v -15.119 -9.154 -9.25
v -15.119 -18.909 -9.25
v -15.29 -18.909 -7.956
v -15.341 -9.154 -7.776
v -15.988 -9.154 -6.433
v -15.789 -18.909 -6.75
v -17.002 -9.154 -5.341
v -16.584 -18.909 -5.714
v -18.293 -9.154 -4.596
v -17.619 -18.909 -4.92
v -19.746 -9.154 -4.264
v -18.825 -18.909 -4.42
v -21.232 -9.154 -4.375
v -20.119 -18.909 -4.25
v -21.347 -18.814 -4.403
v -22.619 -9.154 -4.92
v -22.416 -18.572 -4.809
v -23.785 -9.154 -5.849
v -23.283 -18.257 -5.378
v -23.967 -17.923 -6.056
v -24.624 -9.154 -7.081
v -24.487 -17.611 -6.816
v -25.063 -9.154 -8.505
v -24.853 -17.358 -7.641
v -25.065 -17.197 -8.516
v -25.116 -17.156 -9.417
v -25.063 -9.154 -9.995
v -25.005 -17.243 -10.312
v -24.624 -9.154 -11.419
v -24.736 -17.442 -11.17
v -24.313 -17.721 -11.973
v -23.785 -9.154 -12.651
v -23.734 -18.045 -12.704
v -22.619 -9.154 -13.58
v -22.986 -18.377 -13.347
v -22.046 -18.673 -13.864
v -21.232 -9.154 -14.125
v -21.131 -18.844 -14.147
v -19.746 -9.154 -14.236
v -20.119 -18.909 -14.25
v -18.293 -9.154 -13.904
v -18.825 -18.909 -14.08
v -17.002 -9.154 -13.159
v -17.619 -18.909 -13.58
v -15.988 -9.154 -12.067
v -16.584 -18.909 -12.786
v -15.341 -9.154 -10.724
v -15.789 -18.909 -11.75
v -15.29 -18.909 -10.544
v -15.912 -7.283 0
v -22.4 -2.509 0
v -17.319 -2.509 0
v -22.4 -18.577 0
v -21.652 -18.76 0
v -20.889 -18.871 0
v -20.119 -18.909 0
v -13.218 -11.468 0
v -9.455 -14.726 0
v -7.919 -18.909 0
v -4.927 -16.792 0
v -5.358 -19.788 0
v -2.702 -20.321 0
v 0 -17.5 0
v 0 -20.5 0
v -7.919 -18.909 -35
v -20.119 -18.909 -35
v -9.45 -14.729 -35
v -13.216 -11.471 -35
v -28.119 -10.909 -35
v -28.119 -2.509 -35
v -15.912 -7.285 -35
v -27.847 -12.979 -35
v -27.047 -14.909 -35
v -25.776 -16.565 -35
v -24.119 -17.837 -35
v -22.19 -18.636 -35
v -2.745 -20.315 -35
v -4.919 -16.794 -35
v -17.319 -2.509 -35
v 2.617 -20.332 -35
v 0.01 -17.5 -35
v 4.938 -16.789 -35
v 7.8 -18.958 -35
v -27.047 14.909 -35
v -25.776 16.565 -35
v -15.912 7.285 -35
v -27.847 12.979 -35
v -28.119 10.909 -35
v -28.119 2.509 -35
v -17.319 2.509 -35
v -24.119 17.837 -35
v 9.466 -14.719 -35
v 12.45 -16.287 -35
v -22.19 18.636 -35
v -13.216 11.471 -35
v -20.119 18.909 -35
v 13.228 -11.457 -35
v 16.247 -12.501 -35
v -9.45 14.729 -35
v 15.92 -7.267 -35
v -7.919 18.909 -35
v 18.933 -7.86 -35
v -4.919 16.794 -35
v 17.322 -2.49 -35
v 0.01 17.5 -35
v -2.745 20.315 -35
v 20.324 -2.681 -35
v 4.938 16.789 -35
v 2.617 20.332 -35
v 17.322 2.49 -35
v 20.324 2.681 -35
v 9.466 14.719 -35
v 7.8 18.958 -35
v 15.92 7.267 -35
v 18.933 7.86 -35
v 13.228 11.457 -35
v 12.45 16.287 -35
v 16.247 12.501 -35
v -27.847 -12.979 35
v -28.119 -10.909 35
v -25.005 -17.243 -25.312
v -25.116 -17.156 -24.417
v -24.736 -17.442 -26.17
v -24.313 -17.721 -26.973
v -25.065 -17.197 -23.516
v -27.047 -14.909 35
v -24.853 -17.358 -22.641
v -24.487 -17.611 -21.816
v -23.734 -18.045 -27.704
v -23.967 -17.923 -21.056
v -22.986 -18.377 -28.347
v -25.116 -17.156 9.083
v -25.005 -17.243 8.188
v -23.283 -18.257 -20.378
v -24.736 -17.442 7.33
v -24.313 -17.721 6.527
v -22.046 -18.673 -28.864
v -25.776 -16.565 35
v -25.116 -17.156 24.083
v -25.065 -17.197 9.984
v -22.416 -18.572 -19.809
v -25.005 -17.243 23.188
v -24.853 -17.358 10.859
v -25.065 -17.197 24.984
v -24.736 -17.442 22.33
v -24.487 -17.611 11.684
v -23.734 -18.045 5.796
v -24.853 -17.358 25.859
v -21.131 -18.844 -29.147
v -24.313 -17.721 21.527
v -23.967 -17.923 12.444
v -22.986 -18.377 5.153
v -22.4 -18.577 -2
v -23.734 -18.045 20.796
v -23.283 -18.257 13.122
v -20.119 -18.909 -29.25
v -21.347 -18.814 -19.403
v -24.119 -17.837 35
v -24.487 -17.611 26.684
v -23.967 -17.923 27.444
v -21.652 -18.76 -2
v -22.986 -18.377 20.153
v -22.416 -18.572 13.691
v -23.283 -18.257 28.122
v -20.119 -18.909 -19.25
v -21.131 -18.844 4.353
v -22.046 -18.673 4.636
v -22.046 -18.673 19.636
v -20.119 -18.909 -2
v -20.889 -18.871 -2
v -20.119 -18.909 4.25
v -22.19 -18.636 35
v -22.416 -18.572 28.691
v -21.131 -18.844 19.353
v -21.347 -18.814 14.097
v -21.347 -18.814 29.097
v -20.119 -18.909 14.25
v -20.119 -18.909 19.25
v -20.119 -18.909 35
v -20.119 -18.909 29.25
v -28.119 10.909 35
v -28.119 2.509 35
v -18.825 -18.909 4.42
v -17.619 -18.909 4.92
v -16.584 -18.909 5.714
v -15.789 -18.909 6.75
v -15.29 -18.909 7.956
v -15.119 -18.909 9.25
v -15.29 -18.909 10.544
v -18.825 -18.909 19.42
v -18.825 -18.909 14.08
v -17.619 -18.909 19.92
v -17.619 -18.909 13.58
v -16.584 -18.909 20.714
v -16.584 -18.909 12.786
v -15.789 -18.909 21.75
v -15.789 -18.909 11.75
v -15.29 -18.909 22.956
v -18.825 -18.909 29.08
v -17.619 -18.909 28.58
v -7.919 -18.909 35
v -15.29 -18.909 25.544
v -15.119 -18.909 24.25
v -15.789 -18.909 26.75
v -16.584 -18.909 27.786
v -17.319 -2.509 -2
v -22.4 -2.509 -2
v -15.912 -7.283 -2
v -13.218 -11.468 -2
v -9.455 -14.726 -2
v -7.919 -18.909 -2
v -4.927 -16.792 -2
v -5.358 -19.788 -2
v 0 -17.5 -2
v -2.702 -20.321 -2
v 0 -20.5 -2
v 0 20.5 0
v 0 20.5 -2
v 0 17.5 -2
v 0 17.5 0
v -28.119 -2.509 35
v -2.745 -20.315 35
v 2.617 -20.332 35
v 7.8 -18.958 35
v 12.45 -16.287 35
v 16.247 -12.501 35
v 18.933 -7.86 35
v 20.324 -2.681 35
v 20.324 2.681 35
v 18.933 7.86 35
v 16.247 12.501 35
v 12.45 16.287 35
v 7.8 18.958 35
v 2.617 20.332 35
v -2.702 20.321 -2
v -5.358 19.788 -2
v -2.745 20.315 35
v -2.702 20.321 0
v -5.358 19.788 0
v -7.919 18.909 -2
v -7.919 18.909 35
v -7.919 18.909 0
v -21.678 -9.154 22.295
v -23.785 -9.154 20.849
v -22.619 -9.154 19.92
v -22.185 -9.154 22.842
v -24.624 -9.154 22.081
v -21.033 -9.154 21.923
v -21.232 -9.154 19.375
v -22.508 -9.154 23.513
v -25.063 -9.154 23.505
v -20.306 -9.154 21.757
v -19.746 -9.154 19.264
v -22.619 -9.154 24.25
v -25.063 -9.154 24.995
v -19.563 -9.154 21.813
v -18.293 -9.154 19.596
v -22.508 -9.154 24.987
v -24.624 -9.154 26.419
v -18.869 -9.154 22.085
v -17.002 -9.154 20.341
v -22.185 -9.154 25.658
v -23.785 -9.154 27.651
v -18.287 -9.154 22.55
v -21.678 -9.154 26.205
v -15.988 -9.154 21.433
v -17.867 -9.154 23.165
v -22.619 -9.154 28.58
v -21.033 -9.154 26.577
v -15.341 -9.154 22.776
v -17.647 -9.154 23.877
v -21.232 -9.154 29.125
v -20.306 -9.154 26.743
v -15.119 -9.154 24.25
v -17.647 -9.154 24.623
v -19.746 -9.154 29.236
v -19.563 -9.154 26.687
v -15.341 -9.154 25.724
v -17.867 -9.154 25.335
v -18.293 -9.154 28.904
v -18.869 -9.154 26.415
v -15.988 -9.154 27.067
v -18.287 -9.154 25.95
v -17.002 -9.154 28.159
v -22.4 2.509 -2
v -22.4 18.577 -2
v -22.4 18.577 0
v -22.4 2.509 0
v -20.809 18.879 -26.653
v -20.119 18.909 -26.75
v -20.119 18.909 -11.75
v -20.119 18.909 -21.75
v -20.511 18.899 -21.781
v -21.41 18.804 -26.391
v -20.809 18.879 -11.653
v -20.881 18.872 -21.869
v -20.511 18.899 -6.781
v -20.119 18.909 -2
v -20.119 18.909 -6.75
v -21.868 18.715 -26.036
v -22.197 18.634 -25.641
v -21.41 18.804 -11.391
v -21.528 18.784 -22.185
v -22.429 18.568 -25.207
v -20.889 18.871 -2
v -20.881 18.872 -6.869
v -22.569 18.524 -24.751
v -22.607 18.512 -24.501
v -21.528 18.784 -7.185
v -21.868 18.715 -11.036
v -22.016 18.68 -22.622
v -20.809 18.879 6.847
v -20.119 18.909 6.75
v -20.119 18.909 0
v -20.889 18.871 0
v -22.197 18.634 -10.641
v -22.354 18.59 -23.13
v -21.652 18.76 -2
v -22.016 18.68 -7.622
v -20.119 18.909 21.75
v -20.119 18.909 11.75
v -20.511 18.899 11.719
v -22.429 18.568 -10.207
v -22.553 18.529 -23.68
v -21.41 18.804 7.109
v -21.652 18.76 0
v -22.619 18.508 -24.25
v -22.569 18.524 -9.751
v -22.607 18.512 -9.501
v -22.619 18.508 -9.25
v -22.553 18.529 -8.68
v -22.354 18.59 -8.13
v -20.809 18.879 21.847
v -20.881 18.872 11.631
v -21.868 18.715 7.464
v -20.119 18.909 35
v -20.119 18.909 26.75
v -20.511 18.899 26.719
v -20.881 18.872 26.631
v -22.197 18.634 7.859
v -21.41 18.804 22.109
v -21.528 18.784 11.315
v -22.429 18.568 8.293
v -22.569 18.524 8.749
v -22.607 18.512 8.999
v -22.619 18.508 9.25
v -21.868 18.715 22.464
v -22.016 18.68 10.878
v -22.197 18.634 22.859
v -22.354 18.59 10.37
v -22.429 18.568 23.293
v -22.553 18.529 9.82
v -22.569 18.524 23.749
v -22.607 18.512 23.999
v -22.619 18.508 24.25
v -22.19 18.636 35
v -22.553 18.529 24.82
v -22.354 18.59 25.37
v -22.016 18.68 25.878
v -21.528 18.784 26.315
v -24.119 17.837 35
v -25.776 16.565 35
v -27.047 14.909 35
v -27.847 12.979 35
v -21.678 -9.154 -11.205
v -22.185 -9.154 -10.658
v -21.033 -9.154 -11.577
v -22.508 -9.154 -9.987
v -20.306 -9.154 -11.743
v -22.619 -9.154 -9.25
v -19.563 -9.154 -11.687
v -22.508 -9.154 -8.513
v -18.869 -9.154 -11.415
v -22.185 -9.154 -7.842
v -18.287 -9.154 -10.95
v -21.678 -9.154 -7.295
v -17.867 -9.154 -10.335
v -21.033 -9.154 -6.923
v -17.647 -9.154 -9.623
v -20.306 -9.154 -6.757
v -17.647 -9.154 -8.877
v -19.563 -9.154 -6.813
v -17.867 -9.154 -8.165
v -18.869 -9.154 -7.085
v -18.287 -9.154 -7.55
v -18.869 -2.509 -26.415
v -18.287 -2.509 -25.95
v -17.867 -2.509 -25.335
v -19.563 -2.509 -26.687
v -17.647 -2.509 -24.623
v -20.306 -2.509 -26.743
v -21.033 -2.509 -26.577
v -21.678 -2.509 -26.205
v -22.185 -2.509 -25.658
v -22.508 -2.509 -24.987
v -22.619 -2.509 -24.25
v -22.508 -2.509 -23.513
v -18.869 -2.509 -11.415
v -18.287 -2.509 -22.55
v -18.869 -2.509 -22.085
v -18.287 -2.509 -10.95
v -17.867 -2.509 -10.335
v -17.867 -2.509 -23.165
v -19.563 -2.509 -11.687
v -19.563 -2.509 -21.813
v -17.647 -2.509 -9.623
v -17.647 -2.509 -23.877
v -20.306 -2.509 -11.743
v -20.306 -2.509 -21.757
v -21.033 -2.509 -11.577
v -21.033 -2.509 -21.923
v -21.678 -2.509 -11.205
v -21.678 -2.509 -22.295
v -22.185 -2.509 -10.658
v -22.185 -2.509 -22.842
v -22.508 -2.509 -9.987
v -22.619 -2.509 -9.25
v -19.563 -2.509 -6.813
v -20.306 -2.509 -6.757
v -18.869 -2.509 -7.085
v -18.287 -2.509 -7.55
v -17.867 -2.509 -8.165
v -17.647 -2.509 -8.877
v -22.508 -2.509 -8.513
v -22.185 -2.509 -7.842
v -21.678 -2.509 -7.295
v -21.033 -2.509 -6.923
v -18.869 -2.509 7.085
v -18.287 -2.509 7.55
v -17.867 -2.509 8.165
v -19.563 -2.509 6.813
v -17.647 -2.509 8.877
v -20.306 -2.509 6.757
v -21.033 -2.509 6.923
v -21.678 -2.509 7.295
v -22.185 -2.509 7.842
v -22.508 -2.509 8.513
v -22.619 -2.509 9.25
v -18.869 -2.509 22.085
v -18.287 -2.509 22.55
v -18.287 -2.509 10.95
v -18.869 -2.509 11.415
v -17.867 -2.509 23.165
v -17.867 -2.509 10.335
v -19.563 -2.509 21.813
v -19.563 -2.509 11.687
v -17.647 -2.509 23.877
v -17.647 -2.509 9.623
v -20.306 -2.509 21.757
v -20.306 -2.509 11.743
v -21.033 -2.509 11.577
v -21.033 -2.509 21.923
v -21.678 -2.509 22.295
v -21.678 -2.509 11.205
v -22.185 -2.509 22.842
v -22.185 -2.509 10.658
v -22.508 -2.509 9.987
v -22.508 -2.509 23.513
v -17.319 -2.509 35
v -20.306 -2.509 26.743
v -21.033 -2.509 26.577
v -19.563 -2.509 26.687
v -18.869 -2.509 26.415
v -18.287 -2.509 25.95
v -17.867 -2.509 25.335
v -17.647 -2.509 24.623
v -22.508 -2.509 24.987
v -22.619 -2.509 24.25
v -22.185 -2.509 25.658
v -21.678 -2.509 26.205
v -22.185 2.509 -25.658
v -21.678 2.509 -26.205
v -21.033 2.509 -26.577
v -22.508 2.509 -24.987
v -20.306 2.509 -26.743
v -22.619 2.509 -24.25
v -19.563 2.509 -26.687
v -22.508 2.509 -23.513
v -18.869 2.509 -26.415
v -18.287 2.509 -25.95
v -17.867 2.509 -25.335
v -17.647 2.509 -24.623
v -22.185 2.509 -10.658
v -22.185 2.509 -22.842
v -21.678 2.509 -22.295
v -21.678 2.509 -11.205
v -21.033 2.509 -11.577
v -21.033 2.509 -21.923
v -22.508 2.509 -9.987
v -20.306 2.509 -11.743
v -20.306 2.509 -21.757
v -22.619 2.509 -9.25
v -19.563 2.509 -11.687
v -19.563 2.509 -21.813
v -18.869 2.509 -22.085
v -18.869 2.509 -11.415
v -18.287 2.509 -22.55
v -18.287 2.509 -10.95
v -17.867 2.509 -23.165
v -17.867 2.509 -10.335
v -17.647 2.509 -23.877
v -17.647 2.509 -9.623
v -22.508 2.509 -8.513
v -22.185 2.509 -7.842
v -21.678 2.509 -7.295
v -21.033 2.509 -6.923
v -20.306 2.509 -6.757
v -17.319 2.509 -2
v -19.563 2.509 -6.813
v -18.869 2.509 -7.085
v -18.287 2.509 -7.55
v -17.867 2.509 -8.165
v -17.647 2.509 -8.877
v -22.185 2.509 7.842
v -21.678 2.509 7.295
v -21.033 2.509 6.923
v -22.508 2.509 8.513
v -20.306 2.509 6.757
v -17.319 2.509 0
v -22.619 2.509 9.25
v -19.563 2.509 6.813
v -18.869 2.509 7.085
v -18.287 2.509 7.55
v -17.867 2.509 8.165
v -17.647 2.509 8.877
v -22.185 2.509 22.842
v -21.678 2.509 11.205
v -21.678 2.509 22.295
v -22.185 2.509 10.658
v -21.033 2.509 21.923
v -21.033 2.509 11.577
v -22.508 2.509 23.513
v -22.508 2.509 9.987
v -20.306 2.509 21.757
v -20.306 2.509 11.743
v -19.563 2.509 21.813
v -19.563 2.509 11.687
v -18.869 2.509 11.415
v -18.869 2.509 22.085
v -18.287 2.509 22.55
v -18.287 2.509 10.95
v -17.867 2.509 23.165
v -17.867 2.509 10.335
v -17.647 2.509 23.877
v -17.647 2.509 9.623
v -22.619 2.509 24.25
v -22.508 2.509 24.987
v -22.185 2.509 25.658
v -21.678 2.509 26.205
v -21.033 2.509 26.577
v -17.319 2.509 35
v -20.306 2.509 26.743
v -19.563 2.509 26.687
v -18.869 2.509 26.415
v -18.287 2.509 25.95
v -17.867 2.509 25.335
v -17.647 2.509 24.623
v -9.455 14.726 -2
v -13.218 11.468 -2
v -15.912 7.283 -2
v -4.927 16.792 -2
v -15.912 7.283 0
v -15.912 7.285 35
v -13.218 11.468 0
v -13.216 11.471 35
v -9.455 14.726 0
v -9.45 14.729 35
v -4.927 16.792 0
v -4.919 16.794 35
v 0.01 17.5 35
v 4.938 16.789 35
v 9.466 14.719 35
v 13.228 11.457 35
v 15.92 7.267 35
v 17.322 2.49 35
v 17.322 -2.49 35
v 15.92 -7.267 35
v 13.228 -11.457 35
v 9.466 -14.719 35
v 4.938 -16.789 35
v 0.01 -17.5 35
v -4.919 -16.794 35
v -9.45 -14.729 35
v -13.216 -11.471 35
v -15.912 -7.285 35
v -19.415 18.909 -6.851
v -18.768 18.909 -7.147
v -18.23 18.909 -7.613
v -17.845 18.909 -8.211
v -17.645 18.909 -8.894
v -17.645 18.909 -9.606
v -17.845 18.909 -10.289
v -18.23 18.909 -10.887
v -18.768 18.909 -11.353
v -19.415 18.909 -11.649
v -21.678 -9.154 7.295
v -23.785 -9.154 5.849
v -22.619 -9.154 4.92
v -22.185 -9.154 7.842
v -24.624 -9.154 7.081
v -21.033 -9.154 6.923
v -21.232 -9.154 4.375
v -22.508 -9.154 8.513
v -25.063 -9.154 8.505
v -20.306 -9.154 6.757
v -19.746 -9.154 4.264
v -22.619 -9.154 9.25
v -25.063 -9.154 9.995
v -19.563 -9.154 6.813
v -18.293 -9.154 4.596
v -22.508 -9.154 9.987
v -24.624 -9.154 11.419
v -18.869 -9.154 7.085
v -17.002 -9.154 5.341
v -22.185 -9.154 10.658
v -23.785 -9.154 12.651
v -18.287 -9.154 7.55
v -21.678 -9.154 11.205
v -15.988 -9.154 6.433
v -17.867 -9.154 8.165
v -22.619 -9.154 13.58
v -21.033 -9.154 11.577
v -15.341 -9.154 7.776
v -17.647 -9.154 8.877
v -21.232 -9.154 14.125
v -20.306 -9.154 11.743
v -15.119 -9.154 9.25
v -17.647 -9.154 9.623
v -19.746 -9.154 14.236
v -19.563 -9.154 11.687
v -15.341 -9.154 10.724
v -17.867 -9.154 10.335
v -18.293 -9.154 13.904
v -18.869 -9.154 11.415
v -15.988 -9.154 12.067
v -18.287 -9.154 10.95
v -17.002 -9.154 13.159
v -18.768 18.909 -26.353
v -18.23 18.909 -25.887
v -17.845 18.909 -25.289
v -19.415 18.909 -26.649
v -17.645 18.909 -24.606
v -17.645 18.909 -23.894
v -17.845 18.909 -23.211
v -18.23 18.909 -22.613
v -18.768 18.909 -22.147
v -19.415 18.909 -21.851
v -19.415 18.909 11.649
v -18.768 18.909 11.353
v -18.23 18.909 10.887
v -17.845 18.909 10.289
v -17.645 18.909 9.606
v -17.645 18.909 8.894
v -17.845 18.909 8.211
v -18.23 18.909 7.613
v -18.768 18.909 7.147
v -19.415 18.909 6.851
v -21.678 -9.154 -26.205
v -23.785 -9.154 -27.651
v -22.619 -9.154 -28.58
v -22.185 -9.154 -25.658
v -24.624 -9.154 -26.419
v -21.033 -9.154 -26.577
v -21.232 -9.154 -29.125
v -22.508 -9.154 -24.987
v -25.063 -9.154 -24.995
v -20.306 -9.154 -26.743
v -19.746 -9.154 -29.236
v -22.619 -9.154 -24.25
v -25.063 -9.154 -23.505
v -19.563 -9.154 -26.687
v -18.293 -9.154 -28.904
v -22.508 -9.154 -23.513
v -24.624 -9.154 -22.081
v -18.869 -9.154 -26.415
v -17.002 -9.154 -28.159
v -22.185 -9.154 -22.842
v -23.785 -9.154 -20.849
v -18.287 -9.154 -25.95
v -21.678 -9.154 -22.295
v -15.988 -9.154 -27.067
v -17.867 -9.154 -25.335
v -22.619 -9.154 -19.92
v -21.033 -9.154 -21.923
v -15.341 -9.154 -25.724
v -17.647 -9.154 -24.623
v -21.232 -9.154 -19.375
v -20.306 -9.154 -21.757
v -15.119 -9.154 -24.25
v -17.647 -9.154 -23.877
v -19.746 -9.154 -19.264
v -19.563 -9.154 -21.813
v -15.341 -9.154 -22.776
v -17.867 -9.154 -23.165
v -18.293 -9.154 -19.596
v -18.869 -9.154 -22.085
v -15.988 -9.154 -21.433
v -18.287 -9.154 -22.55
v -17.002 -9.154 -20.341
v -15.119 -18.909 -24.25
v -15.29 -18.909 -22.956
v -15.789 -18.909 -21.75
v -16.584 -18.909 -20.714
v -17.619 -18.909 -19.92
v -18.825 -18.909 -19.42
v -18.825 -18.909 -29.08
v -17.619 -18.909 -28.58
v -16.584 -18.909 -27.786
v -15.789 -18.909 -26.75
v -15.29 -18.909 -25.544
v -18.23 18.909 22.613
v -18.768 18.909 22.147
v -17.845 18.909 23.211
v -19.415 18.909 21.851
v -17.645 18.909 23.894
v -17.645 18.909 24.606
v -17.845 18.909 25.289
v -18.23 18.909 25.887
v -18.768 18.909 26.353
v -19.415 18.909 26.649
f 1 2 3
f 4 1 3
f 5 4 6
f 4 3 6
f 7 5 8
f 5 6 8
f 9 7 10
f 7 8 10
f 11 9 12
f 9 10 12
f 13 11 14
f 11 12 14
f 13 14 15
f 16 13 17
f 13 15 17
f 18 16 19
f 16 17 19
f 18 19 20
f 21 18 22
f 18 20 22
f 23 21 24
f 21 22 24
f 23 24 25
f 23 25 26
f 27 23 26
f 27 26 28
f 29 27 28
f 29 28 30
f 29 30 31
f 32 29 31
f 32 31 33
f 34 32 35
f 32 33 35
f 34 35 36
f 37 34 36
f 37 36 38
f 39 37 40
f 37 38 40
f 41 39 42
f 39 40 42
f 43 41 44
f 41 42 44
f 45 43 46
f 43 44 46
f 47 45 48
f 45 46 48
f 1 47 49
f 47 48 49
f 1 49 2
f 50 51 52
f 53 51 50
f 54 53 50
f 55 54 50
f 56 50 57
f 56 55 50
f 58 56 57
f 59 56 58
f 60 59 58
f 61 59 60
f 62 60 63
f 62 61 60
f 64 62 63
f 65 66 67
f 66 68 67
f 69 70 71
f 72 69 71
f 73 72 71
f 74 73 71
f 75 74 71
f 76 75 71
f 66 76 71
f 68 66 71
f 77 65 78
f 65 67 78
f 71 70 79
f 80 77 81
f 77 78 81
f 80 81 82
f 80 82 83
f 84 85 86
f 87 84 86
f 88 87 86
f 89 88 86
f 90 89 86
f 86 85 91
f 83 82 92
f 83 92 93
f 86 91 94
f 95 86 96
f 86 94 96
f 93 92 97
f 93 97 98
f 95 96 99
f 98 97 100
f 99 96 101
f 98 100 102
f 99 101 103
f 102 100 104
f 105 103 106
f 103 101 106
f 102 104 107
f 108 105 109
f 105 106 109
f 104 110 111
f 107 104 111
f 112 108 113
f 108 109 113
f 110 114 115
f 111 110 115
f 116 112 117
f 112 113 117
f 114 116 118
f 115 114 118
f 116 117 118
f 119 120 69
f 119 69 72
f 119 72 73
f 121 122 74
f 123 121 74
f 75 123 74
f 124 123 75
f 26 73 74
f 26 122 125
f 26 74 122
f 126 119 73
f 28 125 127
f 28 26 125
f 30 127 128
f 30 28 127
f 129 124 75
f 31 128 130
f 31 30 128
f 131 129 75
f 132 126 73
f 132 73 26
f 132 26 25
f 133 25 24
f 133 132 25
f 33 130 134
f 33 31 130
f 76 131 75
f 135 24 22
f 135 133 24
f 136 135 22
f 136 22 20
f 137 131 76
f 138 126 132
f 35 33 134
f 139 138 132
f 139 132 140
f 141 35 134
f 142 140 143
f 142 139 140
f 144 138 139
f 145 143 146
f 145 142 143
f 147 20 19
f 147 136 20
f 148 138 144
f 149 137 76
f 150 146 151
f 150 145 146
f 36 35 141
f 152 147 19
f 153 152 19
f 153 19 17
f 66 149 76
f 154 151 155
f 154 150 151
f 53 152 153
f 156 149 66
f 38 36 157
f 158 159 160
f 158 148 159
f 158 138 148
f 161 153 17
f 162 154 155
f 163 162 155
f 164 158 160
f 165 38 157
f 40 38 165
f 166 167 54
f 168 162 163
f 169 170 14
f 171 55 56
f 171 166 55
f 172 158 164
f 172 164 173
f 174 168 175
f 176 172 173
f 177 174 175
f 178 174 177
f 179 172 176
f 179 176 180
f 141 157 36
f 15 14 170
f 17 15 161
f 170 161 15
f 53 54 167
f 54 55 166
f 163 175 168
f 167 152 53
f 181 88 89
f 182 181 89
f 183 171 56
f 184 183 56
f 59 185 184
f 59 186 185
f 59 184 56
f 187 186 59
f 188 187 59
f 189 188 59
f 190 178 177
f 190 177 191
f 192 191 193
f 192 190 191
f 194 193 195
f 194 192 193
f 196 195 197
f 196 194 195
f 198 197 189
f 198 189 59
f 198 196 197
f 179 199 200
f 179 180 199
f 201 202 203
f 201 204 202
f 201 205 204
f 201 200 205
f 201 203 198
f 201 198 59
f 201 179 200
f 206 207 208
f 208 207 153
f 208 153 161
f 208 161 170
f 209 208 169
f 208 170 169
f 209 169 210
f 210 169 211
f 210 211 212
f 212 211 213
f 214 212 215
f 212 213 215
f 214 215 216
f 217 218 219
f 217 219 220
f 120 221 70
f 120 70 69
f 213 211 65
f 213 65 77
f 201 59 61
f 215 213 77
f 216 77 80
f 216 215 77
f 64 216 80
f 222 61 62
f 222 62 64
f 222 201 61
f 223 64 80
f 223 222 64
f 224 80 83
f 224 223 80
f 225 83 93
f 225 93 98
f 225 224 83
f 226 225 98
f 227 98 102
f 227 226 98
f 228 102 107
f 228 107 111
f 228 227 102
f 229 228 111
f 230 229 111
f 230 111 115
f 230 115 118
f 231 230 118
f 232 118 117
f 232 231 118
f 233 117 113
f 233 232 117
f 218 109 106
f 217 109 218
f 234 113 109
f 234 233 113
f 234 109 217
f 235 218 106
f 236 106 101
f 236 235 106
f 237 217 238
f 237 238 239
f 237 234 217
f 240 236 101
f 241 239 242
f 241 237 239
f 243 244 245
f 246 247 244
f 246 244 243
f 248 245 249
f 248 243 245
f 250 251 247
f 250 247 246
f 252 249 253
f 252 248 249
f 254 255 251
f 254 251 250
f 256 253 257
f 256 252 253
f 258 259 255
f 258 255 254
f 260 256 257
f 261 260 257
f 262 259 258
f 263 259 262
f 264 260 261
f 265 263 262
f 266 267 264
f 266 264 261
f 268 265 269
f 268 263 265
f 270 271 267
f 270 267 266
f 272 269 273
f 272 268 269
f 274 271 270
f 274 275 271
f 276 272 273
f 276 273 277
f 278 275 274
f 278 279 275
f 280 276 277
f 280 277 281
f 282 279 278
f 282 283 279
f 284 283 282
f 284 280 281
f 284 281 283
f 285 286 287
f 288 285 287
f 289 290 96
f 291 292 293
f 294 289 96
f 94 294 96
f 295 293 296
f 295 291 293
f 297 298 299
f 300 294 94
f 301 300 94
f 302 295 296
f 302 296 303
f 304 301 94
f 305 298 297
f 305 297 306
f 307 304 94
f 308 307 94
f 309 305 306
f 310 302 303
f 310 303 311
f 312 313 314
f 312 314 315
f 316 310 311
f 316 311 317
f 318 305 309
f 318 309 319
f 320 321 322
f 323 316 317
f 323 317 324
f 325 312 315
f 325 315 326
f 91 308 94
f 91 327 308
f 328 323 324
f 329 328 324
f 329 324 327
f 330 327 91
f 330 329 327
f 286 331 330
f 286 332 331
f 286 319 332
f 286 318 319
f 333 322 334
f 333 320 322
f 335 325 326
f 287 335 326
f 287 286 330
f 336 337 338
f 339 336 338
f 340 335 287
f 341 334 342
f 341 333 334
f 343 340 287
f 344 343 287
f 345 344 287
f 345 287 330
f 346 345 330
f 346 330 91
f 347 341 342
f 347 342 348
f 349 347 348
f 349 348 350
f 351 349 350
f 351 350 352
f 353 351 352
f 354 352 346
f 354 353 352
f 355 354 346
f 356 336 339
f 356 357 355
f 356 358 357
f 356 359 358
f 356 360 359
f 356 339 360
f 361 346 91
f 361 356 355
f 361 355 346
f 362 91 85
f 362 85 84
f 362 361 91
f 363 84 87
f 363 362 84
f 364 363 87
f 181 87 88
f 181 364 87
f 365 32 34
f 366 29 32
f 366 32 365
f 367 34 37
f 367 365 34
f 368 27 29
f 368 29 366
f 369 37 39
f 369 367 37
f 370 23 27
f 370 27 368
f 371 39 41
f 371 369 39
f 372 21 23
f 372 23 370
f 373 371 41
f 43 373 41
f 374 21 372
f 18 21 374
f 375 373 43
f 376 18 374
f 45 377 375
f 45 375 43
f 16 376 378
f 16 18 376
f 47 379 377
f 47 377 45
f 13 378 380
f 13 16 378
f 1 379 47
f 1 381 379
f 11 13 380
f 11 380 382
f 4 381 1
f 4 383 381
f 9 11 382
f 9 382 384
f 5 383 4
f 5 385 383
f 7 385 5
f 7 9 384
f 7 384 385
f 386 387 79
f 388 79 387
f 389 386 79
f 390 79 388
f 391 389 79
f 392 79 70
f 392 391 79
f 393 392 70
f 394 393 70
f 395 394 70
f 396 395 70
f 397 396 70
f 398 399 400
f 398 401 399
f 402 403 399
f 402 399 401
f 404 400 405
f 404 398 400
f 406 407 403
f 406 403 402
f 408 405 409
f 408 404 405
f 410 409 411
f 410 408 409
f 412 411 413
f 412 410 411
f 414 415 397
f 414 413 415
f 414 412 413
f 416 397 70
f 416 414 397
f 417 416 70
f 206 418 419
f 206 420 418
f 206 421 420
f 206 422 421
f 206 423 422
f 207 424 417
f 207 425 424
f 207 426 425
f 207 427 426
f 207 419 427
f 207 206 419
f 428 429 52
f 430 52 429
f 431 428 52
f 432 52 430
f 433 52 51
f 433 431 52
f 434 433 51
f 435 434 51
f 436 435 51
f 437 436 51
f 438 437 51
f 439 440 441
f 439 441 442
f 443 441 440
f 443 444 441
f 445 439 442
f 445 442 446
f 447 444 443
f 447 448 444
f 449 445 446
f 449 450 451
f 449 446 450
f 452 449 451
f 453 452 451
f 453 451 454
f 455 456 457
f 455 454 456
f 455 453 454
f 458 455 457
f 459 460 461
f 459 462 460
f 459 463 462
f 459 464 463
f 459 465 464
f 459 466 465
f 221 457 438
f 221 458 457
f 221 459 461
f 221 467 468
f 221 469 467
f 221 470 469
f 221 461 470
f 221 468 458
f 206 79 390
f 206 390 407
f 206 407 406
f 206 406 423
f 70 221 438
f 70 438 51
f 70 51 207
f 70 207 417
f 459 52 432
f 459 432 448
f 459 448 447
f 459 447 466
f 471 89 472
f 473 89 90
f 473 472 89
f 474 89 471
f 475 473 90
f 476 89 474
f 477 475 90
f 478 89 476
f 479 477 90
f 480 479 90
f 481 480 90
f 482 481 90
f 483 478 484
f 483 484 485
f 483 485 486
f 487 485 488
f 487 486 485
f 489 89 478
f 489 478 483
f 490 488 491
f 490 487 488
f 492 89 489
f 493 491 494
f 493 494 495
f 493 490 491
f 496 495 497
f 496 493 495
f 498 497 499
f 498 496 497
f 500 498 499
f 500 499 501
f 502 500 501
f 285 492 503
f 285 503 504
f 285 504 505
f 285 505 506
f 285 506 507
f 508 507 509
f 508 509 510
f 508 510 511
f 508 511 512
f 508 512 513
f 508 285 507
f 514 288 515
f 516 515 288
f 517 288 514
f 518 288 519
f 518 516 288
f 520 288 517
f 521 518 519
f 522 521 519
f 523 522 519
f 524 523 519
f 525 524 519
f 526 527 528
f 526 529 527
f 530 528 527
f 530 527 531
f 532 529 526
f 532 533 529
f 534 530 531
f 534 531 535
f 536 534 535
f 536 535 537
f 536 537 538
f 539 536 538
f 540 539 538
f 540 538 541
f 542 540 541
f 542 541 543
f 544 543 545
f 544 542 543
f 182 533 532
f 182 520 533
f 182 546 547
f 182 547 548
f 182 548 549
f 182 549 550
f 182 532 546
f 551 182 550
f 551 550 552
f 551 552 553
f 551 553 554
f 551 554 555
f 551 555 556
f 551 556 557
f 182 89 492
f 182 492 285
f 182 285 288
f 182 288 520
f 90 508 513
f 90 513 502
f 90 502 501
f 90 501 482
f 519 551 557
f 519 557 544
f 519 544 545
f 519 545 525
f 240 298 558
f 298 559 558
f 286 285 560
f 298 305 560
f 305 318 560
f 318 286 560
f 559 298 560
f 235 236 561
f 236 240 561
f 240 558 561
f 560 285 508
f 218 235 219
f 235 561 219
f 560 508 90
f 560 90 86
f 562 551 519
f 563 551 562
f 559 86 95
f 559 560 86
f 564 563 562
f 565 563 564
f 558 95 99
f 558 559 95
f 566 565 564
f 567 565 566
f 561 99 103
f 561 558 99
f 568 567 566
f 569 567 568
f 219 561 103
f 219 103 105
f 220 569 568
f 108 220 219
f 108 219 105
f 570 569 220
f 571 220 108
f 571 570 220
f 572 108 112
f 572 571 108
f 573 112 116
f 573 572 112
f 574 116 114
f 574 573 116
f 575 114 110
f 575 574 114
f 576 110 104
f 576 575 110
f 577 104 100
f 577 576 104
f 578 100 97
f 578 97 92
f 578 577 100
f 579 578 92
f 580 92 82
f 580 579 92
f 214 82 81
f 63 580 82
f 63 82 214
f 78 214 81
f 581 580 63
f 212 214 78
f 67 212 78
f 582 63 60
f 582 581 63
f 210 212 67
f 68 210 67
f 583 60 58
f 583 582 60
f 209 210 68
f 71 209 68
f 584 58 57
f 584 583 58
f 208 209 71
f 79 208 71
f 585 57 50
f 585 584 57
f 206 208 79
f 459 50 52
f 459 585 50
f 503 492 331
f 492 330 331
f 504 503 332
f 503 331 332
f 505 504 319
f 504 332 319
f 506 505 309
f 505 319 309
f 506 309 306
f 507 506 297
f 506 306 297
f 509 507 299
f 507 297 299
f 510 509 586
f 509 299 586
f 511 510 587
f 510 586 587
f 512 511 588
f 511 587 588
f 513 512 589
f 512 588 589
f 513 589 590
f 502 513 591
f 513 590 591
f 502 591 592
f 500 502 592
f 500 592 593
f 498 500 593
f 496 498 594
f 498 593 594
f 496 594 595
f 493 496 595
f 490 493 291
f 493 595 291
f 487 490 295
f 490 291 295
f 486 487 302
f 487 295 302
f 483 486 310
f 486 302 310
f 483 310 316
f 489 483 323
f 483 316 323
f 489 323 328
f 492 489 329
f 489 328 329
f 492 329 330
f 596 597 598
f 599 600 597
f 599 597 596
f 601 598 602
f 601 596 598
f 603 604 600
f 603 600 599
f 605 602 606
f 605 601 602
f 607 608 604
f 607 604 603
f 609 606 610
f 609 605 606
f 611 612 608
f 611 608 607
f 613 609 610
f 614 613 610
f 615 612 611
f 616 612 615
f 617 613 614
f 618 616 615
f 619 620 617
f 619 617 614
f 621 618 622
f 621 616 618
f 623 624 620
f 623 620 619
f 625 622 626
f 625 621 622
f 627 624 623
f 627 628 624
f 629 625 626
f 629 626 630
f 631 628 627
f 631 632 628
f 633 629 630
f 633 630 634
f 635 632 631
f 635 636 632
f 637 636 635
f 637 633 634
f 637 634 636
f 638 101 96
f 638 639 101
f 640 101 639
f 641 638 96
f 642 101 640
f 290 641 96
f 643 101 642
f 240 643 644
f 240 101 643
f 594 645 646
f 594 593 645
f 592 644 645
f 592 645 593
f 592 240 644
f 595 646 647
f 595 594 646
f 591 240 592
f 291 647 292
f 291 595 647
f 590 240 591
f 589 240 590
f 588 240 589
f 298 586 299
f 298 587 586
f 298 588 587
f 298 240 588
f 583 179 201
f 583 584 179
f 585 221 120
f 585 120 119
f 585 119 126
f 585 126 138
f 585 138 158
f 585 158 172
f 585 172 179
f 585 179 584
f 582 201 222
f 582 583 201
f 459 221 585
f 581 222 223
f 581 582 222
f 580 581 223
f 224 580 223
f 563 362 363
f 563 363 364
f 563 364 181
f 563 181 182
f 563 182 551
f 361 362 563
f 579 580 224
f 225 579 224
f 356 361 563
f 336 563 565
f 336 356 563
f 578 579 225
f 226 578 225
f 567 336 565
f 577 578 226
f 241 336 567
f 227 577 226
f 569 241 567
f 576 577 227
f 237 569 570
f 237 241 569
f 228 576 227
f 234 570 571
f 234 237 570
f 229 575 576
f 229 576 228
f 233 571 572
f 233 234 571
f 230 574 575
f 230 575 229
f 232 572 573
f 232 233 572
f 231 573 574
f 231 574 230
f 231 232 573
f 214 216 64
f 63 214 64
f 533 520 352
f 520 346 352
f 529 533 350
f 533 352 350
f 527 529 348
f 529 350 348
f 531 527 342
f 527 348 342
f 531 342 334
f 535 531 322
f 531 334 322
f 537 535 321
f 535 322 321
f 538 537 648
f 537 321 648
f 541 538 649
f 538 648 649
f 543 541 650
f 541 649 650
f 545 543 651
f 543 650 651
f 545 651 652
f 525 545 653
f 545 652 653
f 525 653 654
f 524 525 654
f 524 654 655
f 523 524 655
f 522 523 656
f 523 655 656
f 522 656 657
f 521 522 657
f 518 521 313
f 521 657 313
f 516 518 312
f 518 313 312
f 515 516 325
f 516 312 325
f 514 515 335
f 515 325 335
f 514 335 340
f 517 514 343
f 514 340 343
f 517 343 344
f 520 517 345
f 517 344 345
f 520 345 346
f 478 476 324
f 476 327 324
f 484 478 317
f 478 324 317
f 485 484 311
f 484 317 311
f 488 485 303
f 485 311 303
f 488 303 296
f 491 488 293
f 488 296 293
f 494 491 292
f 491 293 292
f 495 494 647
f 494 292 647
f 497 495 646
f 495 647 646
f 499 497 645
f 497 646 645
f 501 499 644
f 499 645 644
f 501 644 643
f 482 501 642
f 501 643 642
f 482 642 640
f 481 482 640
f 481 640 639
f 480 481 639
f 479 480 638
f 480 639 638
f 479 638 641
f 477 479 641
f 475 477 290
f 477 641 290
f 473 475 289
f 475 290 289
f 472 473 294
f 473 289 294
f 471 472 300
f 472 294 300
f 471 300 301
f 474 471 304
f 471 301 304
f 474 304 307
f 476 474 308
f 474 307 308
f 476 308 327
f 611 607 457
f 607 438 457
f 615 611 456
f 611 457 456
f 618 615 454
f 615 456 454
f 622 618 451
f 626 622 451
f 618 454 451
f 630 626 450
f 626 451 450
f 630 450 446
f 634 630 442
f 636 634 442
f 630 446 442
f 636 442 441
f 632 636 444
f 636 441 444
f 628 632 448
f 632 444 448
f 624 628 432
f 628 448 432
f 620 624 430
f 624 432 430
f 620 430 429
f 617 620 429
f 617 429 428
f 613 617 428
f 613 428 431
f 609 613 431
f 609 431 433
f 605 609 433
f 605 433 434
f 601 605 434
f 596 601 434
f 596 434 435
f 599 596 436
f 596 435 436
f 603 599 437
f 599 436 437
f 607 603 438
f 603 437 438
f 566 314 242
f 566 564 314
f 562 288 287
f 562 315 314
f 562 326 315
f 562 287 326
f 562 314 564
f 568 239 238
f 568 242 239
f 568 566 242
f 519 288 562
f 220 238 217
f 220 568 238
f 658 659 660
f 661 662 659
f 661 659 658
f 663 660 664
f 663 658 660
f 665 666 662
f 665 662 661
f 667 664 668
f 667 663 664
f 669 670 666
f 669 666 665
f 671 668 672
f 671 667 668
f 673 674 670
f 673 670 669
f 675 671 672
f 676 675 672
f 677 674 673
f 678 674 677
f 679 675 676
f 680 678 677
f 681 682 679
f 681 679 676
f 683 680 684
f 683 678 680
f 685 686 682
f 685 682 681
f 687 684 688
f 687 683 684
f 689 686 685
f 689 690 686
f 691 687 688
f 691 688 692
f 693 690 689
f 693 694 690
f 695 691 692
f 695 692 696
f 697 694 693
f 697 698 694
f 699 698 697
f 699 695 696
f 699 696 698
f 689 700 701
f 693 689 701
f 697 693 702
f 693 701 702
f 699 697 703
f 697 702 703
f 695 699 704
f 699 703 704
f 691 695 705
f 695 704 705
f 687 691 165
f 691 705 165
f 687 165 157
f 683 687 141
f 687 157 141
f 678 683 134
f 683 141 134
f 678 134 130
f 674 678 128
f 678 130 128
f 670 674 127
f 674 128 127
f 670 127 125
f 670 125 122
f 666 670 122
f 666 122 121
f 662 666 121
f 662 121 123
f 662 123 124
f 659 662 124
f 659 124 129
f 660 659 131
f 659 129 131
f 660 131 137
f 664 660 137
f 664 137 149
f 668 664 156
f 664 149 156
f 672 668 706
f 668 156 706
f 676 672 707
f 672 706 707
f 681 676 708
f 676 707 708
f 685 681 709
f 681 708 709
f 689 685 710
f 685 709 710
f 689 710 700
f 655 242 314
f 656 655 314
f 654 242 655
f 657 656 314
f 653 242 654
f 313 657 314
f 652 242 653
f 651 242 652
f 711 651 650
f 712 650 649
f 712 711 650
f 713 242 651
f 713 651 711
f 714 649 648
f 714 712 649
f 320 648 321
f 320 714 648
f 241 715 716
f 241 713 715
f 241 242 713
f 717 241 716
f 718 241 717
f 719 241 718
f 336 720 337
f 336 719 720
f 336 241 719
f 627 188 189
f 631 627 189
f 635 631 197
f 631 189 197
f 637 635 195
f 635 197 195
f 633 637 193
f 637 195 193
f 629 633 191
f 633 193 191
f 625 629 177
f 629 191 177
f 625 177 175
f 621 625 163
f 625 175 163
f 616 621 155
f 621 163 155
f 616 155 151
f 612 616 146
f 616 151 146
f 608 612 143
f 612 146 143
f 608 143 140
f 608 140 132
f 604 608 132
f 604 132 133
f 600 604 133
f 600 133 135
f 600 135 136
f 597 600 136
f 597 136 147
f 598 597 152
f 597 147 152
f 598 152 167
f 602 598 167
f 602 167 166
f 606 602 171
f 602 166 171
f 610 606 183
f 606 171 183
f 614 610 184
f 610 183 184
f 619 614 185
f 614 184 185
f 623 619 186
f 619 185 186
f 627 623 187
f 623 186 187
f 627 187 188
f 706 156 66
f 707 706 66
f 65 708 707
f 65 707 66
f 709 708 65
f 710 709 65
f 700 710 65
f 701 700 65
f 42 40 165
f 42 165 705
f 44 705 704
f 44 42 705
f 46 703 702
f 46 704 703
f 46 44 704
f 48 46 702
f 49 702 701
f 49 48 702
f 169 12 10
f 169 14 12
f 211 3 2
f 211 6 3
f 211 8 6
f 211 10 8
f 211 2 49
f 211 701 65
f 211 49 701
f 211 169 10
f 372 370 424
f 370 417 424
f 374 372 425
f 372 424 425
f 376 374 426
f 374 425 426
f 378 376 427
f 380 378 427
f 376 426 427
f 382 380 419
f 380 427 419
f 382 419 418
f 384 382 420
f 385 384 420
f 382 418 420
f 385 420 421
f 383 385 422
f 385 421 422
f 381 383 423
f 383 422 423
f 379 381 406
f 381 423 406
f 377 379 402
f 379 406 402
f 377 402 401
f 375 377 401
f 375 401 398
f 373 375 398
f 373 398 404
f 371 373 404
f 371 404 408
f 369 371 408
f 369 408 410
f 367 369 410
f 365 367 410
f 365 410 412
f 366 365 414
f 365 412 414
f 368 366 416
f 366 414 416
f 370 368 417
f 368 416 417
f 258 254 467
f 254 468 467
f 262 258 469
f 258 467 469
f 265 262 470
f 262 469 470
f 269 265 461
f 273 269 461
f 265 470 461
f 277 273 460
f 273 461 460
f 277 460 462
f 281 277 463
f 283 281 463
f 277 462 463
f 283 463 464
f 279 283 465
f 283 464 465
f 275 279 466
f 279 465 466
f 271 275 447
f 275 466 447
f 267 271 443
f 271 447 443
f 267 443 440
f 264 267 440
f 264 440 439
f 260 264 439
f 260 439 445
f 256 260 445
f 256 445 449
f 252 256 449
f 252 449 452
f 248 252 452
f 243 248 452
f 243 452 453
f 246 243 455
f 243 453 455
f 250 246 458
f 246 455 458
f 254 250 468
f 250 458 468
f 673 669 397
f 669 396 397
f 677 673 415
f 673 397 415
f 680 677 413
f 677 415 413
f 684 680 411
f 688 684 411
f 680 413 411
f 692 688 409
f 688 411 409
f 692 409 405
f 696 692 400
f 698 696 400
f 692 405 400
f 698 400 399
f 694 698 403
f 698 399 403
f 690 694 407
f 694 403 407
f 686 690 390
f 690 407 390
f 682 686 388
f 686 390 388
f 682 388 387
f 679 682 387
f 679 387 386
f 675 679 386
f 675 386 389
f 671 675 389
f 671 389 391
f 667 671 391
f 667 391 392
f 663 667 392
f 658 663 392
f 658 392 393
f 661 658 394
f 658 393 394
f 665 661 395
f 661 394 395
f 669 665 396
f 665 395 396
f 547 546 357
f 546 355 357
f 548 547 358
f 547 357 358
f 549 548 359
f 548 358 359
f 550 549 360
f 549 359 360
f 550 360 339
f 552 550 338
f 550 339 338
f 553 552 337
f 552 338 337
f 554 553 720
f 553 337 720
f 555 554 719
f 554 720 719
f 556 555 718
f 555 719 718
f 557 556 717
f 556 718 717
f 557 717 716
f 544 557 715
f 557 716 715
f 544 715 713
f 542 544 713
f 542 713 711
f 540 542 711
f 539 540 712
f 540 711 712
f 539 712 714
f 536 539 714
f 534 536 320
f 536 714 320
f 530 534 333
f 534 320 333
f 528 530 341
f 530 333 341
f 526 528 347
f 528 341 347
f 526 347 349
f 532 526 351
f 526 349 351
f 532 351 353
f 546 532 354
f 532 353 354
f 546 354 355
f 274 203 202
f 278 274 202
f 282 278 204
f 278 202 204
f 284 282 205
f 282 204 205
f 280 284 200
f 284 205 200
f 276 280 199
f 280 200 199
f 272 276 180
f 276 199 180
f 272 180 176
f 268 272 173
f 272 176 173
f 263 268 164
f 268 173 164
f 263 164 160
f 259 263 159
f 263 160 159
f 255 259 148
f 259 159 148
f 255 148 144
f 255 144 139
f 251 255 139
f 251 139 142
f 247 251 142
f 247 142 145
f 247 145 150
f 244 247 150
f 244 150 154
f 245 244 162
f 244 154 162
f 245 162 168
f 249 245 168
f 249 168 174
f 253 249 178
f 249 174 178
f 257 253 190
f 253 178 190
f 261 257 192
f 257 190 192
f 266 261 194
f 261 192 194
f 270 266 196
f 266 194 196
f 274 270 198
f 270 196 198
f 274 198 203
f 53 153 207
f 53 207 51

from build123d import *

# Parameters (mm, degrees)
F1_DEPTH       = 35
F3_D           = 5
F3_START       = 1.7550021
F3_CBORE_D     = 10
F3_CBORE_DEPTH = 8
F4_W           = 22.4
F4_H           = 2
F5_DEPTH       = 25


with BuildPart() as f1:
    # F0 (on Top) → F1 (new body, symmetric)
    with BuildSketch(Plane.XY):
        with BuildLine():
            ThreePointArc((-17.3192642082, 2.5086026559), (17.5, 0), (-17.3192642082, -2.5086026559))
            Line((-17.3192642082, -2.5086026559), (-28.1192642082, -2.5086026559))
            Line((-28.1192642082, -2.5086026559), (-28.1192642082, -10.9086026559))
            ThreePointArc((-28.1192642082, -10.9086026559), (-25.7761184577, -16.5654569054), (-20.1192642082, -18.9086026559))
            Line((-20.1192642082, -18.9086026559), (-7.9192642082, -18.9086026559))
            ThreePointArc((-7.9192642082, -18.9086026559), (20.5, 0), (-7.9192642082, 18.9086026559))
            Line((-7.9192642082, 18.9086026559), (-20.1192642082, 18.9086026559))
            ThreePointArc((-20.1192642082, 18.9086026559), (-25.7761184577, 16.5654569054), (-28.1192642082, 10.9086026559))
            Line((-28.1192642082, 10.9086026559), (-28.1192642082, 2.5086026559))
            Line((-28.1192642082, 2.5086026559), (-17.3192642082, 2.5086026559))
        make_face()
    extrude(amount=F1_DEPTH, both=True)

    # F3 (through all)
    # its depths count from where the whole tool has entered the part; down to there all is cleared
    with Locations(Plane.XZ.offset(18.9086026559).offset(-F3_START)):
        with Locations((-20.1192642082, 24.25), (-20.1192642082, 9.25), (-20.1192642082, -9.25), (-20.1192642082, -24.25)):
            CounterBoreHole(F3_D / 2, F3_CBORE_D / 2, F3_CBORE_DEPTH)

    # F4 (on Front) → F5 (cut, symmetric)
    with BuildSketch(Plane.XZ):
        with Locations((-11.2, -1)):
            Rectangle(F4_W, F4_H)
    extrude(amount=F5_DEPTH, both=True, mode=Mode.SUBTRACT)


solid = f1.part
